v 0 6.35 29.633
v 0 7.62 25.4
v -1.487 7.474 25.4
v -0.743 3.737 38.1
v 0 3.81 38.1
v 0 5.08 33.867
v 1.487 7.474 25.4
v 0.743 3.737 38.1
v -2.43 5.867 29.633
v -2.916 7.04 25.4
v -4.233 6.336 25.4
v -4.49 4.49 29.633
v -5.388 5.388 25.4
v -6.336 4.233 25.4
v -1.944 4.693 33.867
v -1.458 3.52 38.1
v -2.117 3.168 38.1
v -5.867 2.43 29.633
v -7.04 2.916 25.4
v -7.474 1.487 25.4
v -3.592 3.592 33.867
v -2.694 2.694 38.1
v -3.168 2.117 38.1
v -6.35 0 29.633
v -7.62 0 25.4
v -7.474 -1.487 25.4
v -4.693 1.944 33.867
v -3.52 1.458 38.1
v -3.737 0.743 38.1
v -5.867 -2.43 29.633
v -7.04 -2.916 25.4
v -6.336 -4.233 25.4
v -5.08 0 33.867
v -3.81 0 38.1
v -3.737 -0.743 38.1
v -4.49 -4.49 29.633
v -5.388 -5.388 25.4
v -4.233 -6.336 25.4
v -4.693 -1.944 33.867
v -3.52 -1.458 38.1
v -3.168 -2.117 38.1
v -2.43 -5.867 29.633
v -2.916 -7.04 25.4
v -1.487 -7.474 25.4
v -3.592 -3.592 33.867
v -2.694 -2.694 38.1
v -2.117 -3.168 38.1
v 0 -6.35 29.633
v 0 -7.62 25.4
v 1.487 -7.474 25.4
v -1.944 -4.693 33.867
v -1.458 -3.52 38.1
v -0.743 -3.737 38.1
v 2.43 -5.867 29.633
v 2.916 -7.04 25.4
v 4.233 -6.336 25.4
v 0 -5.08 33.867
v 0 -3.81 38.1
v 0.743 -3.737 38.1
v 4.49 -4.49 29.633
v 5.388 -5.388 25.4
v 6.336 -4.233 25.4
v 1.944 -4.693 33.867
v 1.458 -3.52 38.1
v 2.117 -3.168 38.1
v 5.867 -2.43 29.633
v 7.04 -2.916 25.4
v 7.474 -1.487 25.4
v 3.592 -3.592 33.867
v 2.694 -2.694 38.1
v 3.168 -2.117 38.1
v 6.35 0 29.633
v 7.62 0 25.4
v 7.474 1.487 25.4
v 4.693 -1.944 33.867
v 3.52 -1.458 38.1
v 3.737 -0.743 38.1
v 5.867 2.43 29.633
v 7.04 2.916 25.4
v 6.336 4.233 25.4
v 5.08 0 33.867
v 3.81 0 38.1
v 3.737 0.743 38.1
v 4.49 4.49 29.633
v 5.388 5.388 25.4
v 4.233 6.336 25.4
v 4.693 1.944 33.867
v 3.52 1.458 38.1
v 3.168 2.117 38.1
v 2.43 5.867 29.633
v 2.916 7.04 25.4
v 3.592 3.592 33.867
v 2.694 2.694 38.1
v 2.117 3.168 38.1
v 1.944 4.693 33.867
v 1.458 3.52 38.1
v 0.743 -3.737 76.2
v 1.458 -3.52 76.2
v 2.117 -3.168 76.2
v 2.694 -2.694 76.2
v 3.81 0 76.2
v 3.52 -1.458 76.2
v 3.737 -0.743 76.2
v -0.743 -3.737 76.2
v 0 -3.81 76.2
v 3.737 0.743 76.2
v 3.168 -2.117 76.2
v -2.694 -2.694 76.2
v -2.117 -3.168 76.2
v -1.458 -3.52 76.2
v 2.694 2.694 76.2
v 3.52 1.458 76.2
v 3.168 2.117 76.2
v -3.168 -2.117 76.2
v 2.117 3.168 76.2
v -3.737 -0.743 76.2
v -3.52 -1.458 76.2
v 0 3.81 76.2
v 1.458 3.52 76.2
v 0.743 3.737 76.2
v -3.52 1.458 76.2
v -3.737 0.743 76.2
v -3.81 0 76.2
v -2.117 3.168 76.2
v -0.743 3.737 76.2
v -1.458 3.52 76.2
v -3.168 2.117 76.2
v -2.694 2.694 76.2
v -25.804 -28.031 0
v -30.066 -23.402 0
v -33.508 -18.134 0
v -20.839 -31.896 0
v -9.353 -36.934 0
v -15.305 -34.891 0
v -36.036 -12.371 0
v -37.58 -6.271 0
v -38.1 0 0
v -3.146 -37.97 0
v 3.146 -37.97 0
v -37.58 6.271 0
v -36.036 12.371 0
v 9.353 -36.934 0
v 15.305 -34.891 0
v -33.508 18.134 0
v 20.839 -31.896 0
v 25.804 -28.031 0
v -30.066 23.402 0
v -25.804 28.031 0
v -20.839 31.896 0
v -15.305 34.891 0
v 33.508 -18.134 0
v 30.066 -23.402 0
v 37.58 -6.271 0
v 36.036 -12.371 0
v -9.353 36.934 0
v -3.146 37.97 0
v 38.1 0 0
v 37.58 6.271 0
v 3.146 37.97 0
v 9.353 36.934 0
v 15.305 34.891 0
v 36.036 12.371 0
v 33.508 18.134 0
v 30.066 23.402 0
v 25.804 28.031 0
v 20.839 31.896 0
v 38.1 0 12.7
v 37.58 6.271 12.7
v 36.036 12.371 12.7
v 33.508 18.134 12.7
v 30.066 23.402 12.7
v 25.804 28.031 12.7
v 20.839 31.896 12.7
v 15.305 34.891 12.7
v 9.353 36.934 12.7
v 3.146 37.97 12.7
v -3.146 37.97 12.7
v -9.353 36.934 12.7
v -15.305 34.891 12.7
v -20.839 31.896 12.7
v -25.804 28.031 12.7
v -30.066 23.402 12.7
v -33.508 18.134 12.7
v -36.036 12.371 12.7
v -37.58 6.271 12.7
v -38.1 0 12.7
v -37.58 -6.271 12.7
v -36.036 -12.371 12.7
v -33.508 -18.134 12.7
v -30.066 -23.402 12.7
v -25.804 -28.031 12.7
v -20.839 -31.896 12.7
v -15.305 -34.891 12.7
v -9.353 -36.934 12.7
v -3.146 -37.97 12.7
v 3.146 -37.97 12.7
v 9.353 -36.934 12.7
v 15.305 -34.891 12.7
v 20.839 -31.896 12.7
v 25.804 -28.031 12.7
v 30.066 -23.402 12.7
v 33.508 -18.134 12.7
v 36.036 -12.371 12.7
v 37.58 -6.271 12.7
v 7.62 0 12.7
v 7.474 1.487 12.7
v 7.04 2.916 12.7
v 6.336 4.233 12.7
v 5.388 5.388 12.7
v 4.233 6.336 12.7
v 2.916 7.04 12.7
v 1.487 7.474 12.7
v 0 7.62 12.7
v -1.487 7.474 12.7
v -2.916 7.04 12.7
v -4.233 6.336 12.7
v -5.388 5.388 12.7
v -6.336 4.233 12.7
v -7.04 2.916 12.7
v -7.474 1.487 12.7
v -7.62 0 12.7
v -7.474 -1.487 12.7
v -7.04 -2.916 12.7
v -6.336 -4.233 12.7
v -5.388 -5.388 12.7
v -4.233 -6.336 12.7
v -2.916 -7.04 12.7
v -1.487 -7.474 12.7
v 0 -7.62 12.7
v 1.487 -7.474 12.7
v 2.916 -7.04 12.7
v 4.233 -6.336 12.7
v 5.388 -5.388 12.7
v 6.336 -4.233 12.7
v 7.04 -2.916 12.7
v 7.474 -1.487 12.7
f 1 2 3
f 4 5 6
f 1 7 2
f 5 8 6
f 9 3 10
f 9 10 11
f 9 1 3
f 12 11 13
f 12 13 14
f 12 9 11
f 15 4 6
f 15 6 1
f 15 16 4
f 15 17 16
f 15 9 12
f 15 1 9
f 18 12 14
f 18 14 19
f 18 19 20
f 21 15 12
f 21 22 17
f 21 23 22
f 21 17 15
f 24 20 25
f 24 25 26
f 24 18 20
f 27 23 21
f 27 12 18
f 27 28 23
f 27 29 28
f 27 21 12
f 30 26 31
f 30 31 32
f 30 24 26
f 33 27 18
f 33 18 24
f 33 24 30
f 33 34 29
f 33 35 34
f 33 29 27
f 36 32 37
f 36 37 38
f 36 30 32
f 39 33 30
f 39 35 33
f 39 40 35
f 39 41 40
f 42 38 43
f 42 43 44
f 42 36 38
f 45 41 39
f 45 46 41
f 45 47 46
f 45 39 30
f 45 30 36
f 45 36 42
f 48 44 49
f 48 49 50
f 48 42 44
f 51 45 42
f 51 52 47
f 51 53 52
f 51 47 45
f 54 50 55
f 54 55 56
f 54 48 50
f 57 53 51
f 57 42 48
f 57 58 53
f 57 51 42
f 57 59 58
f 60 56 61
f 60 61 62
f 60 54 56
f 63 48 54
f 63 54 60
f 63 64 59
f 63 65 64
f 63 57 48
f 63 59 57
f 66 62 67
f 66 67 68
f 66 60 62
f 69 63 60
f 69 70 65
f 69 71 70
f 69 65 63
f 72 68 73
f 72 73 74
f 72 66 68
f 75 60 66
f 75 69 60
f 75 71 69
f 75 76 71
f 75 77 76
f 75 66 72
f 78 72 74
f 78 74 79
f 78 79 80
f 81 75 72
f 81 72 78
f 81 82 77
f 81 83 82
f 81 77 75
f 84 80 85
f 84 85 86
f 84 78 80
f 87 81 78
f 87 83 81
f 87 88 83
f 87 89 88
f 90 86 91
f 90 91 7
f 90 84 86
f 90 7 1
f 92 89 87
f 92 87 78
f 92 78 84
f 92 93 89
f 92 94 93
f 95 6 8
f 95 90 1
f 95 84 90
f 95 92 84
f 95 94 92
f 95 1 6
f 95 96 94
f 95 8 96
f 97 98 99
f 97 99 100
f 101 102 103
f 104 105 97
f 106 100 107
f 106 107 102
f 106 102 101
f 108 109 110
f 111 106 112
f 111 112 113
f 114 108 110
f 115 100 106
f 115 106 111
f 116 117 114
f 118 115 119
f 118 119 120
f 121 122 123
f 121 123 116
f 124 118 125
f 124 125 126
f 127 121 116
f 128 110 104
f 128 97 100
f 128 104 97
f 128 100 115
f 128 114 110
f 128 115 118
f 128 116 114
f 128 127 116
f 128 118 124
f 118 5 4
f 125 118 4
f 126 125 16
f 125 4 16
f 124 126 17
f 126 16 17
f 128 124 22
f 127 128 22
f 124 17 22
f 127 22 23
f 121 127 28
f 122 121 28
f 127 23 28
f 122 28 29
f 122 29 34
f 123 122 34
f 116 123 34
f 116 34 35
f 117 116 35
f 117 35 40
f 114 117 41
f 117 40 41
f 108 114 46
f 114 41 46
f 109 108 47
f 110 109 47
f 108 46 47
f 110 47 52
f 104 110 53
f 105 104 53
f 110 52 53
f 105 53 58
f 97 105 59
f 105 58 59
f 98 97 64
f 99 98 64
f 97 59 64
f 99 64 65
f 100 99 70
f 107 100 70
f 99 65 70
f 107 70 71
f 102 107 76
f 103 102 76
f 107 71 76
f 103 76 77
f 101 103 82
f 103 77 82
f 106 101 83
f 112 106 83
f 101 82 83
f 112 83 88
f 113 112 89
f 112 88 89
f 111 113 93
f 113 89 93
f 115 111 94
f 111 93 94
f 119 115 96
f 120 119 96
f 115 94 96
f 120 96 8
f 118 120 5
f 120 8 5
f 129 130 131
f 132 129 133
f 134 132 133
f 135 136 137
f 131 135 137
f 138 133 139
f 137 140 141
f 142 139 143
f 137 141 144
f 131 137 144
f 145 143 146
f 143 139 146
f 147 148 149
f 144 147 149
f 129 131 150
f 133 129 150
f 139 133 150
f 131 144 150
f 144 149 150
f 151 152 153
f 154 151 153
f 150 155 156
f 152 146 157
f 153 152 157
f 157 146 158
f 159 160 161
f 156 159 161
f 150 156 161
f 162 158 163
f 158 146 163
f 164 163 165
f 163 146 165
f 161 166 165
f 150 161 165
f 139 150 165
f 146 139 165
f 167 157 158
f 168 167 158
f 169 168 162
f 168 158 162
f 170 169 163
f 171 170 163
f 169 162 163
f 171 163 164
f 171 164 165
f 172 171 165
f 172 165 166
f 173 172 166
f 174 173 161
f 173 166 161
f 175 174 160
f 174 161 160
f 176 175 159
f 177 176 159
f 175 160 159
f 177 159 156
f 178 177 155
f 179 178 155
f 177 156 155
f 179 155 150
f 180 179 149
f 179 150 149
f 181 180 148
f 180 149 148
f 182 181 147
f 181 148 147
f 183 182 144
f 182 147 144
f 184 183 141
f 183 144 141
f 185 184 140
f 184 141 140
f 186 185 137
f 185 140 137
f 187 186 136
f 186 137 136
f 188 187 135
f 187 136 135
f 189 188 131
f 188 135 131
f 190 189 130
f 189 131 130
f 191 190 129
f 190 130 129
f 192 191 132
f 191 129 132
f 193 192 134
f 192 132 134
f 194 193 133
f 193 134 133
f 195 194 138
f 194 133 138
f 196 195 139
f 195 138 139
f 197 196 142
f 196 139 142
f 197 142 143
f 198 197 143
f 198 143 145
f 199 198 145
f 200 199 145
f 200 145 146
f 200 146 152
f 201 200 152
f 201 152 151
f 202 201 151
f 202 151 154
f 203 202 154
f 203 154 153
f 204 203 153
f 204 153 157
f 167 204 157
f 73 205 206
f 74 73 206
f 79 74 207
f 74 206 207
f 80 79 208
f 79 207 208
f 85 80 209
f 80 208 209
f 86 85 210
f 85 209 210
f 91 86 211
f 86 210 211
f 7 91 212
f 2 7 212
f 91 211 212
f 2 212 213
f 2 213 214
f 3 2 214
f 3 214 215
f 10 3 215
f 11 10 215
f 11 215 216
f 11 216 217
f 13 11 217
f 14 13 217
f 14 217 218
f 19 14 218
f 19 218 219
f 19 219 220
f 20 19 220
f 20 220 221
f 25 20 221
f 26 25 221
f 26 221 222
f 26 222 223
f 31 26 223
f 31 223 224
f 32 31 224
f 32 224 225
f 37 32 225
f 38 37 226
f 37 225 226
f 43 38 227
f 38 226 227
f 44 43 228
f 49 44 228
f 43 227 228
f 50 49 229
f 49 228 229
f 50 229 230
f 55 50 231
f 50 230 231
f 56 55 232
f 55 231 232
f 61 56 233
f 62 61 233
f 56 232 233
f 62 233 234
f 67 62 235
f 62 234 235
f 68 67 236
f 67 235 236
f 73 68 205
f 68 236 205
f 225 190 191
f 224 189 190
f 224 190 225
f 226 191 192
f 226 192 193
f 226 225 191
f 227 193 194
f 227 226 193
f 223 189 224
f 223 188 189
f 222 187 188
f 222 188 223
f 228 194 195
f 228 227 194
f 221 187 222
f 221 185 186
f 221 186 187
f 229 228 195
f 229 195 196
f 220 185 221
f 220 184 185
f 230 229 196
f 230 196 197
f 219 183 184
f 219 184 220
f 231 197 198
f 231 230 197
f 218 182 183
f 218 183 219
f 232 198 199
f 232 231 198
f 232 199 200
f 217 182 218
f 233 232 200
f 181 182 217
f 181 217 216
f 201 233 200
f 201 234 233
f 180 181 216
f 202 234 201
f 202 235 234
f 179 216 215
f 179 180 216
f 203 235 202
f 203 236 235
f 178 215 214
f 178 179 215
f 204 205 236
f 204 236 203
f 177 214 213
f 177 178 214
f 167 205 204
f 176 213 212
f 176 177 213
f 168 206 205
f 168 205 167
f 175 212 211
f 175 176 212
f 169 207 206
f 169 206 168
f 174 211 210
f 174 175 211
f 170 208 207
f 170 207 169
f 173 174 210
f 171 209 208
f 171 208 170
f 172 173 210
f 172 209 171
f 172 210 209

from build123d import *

# Parameters (mm, degrees)
F0_R     = 38.1
F1_DEPTH = 12.7
F2_R     = 7.62
F3_DEPTH = 12.7
F6_DEPTH = 38.1


# Not quite as in the source:
# - a feature names something its author has since deleted; it is built from what else it names


with BuildPart() as f1:
    # F0 (on Top) → F1 (new body)
    with BuildSketch(Plane.XY):
        Circle(F0_R)
    extrude(amount=F1_DEPTH)

    # F2 (on face) → F3 (join)
    with BuildSketch(Plane.XY.offset(12.7)):
        Circle(F2_R)
    extrude(amount=F3_DEPTH)

    # F4 (on Right) → F5 (revolve)
    with BuildSketch(Plane.YZ):
        Polygon((0, 38.1), (0, 25.4), (7.62, 25.4), (3.81, 38.1), align=None)
    revolve(axis=Axis((0, 0, 31.75), (0, 0, 1)))

    # F6 (add): a face of the model
    f6_faces = [f1.faces().sort_by_distance(p)[0] for p in [
        (0, 0, 38.1),
    ]]
    extrude(f6_faces, amount=F6_DEPTH)


solid = f1.part
